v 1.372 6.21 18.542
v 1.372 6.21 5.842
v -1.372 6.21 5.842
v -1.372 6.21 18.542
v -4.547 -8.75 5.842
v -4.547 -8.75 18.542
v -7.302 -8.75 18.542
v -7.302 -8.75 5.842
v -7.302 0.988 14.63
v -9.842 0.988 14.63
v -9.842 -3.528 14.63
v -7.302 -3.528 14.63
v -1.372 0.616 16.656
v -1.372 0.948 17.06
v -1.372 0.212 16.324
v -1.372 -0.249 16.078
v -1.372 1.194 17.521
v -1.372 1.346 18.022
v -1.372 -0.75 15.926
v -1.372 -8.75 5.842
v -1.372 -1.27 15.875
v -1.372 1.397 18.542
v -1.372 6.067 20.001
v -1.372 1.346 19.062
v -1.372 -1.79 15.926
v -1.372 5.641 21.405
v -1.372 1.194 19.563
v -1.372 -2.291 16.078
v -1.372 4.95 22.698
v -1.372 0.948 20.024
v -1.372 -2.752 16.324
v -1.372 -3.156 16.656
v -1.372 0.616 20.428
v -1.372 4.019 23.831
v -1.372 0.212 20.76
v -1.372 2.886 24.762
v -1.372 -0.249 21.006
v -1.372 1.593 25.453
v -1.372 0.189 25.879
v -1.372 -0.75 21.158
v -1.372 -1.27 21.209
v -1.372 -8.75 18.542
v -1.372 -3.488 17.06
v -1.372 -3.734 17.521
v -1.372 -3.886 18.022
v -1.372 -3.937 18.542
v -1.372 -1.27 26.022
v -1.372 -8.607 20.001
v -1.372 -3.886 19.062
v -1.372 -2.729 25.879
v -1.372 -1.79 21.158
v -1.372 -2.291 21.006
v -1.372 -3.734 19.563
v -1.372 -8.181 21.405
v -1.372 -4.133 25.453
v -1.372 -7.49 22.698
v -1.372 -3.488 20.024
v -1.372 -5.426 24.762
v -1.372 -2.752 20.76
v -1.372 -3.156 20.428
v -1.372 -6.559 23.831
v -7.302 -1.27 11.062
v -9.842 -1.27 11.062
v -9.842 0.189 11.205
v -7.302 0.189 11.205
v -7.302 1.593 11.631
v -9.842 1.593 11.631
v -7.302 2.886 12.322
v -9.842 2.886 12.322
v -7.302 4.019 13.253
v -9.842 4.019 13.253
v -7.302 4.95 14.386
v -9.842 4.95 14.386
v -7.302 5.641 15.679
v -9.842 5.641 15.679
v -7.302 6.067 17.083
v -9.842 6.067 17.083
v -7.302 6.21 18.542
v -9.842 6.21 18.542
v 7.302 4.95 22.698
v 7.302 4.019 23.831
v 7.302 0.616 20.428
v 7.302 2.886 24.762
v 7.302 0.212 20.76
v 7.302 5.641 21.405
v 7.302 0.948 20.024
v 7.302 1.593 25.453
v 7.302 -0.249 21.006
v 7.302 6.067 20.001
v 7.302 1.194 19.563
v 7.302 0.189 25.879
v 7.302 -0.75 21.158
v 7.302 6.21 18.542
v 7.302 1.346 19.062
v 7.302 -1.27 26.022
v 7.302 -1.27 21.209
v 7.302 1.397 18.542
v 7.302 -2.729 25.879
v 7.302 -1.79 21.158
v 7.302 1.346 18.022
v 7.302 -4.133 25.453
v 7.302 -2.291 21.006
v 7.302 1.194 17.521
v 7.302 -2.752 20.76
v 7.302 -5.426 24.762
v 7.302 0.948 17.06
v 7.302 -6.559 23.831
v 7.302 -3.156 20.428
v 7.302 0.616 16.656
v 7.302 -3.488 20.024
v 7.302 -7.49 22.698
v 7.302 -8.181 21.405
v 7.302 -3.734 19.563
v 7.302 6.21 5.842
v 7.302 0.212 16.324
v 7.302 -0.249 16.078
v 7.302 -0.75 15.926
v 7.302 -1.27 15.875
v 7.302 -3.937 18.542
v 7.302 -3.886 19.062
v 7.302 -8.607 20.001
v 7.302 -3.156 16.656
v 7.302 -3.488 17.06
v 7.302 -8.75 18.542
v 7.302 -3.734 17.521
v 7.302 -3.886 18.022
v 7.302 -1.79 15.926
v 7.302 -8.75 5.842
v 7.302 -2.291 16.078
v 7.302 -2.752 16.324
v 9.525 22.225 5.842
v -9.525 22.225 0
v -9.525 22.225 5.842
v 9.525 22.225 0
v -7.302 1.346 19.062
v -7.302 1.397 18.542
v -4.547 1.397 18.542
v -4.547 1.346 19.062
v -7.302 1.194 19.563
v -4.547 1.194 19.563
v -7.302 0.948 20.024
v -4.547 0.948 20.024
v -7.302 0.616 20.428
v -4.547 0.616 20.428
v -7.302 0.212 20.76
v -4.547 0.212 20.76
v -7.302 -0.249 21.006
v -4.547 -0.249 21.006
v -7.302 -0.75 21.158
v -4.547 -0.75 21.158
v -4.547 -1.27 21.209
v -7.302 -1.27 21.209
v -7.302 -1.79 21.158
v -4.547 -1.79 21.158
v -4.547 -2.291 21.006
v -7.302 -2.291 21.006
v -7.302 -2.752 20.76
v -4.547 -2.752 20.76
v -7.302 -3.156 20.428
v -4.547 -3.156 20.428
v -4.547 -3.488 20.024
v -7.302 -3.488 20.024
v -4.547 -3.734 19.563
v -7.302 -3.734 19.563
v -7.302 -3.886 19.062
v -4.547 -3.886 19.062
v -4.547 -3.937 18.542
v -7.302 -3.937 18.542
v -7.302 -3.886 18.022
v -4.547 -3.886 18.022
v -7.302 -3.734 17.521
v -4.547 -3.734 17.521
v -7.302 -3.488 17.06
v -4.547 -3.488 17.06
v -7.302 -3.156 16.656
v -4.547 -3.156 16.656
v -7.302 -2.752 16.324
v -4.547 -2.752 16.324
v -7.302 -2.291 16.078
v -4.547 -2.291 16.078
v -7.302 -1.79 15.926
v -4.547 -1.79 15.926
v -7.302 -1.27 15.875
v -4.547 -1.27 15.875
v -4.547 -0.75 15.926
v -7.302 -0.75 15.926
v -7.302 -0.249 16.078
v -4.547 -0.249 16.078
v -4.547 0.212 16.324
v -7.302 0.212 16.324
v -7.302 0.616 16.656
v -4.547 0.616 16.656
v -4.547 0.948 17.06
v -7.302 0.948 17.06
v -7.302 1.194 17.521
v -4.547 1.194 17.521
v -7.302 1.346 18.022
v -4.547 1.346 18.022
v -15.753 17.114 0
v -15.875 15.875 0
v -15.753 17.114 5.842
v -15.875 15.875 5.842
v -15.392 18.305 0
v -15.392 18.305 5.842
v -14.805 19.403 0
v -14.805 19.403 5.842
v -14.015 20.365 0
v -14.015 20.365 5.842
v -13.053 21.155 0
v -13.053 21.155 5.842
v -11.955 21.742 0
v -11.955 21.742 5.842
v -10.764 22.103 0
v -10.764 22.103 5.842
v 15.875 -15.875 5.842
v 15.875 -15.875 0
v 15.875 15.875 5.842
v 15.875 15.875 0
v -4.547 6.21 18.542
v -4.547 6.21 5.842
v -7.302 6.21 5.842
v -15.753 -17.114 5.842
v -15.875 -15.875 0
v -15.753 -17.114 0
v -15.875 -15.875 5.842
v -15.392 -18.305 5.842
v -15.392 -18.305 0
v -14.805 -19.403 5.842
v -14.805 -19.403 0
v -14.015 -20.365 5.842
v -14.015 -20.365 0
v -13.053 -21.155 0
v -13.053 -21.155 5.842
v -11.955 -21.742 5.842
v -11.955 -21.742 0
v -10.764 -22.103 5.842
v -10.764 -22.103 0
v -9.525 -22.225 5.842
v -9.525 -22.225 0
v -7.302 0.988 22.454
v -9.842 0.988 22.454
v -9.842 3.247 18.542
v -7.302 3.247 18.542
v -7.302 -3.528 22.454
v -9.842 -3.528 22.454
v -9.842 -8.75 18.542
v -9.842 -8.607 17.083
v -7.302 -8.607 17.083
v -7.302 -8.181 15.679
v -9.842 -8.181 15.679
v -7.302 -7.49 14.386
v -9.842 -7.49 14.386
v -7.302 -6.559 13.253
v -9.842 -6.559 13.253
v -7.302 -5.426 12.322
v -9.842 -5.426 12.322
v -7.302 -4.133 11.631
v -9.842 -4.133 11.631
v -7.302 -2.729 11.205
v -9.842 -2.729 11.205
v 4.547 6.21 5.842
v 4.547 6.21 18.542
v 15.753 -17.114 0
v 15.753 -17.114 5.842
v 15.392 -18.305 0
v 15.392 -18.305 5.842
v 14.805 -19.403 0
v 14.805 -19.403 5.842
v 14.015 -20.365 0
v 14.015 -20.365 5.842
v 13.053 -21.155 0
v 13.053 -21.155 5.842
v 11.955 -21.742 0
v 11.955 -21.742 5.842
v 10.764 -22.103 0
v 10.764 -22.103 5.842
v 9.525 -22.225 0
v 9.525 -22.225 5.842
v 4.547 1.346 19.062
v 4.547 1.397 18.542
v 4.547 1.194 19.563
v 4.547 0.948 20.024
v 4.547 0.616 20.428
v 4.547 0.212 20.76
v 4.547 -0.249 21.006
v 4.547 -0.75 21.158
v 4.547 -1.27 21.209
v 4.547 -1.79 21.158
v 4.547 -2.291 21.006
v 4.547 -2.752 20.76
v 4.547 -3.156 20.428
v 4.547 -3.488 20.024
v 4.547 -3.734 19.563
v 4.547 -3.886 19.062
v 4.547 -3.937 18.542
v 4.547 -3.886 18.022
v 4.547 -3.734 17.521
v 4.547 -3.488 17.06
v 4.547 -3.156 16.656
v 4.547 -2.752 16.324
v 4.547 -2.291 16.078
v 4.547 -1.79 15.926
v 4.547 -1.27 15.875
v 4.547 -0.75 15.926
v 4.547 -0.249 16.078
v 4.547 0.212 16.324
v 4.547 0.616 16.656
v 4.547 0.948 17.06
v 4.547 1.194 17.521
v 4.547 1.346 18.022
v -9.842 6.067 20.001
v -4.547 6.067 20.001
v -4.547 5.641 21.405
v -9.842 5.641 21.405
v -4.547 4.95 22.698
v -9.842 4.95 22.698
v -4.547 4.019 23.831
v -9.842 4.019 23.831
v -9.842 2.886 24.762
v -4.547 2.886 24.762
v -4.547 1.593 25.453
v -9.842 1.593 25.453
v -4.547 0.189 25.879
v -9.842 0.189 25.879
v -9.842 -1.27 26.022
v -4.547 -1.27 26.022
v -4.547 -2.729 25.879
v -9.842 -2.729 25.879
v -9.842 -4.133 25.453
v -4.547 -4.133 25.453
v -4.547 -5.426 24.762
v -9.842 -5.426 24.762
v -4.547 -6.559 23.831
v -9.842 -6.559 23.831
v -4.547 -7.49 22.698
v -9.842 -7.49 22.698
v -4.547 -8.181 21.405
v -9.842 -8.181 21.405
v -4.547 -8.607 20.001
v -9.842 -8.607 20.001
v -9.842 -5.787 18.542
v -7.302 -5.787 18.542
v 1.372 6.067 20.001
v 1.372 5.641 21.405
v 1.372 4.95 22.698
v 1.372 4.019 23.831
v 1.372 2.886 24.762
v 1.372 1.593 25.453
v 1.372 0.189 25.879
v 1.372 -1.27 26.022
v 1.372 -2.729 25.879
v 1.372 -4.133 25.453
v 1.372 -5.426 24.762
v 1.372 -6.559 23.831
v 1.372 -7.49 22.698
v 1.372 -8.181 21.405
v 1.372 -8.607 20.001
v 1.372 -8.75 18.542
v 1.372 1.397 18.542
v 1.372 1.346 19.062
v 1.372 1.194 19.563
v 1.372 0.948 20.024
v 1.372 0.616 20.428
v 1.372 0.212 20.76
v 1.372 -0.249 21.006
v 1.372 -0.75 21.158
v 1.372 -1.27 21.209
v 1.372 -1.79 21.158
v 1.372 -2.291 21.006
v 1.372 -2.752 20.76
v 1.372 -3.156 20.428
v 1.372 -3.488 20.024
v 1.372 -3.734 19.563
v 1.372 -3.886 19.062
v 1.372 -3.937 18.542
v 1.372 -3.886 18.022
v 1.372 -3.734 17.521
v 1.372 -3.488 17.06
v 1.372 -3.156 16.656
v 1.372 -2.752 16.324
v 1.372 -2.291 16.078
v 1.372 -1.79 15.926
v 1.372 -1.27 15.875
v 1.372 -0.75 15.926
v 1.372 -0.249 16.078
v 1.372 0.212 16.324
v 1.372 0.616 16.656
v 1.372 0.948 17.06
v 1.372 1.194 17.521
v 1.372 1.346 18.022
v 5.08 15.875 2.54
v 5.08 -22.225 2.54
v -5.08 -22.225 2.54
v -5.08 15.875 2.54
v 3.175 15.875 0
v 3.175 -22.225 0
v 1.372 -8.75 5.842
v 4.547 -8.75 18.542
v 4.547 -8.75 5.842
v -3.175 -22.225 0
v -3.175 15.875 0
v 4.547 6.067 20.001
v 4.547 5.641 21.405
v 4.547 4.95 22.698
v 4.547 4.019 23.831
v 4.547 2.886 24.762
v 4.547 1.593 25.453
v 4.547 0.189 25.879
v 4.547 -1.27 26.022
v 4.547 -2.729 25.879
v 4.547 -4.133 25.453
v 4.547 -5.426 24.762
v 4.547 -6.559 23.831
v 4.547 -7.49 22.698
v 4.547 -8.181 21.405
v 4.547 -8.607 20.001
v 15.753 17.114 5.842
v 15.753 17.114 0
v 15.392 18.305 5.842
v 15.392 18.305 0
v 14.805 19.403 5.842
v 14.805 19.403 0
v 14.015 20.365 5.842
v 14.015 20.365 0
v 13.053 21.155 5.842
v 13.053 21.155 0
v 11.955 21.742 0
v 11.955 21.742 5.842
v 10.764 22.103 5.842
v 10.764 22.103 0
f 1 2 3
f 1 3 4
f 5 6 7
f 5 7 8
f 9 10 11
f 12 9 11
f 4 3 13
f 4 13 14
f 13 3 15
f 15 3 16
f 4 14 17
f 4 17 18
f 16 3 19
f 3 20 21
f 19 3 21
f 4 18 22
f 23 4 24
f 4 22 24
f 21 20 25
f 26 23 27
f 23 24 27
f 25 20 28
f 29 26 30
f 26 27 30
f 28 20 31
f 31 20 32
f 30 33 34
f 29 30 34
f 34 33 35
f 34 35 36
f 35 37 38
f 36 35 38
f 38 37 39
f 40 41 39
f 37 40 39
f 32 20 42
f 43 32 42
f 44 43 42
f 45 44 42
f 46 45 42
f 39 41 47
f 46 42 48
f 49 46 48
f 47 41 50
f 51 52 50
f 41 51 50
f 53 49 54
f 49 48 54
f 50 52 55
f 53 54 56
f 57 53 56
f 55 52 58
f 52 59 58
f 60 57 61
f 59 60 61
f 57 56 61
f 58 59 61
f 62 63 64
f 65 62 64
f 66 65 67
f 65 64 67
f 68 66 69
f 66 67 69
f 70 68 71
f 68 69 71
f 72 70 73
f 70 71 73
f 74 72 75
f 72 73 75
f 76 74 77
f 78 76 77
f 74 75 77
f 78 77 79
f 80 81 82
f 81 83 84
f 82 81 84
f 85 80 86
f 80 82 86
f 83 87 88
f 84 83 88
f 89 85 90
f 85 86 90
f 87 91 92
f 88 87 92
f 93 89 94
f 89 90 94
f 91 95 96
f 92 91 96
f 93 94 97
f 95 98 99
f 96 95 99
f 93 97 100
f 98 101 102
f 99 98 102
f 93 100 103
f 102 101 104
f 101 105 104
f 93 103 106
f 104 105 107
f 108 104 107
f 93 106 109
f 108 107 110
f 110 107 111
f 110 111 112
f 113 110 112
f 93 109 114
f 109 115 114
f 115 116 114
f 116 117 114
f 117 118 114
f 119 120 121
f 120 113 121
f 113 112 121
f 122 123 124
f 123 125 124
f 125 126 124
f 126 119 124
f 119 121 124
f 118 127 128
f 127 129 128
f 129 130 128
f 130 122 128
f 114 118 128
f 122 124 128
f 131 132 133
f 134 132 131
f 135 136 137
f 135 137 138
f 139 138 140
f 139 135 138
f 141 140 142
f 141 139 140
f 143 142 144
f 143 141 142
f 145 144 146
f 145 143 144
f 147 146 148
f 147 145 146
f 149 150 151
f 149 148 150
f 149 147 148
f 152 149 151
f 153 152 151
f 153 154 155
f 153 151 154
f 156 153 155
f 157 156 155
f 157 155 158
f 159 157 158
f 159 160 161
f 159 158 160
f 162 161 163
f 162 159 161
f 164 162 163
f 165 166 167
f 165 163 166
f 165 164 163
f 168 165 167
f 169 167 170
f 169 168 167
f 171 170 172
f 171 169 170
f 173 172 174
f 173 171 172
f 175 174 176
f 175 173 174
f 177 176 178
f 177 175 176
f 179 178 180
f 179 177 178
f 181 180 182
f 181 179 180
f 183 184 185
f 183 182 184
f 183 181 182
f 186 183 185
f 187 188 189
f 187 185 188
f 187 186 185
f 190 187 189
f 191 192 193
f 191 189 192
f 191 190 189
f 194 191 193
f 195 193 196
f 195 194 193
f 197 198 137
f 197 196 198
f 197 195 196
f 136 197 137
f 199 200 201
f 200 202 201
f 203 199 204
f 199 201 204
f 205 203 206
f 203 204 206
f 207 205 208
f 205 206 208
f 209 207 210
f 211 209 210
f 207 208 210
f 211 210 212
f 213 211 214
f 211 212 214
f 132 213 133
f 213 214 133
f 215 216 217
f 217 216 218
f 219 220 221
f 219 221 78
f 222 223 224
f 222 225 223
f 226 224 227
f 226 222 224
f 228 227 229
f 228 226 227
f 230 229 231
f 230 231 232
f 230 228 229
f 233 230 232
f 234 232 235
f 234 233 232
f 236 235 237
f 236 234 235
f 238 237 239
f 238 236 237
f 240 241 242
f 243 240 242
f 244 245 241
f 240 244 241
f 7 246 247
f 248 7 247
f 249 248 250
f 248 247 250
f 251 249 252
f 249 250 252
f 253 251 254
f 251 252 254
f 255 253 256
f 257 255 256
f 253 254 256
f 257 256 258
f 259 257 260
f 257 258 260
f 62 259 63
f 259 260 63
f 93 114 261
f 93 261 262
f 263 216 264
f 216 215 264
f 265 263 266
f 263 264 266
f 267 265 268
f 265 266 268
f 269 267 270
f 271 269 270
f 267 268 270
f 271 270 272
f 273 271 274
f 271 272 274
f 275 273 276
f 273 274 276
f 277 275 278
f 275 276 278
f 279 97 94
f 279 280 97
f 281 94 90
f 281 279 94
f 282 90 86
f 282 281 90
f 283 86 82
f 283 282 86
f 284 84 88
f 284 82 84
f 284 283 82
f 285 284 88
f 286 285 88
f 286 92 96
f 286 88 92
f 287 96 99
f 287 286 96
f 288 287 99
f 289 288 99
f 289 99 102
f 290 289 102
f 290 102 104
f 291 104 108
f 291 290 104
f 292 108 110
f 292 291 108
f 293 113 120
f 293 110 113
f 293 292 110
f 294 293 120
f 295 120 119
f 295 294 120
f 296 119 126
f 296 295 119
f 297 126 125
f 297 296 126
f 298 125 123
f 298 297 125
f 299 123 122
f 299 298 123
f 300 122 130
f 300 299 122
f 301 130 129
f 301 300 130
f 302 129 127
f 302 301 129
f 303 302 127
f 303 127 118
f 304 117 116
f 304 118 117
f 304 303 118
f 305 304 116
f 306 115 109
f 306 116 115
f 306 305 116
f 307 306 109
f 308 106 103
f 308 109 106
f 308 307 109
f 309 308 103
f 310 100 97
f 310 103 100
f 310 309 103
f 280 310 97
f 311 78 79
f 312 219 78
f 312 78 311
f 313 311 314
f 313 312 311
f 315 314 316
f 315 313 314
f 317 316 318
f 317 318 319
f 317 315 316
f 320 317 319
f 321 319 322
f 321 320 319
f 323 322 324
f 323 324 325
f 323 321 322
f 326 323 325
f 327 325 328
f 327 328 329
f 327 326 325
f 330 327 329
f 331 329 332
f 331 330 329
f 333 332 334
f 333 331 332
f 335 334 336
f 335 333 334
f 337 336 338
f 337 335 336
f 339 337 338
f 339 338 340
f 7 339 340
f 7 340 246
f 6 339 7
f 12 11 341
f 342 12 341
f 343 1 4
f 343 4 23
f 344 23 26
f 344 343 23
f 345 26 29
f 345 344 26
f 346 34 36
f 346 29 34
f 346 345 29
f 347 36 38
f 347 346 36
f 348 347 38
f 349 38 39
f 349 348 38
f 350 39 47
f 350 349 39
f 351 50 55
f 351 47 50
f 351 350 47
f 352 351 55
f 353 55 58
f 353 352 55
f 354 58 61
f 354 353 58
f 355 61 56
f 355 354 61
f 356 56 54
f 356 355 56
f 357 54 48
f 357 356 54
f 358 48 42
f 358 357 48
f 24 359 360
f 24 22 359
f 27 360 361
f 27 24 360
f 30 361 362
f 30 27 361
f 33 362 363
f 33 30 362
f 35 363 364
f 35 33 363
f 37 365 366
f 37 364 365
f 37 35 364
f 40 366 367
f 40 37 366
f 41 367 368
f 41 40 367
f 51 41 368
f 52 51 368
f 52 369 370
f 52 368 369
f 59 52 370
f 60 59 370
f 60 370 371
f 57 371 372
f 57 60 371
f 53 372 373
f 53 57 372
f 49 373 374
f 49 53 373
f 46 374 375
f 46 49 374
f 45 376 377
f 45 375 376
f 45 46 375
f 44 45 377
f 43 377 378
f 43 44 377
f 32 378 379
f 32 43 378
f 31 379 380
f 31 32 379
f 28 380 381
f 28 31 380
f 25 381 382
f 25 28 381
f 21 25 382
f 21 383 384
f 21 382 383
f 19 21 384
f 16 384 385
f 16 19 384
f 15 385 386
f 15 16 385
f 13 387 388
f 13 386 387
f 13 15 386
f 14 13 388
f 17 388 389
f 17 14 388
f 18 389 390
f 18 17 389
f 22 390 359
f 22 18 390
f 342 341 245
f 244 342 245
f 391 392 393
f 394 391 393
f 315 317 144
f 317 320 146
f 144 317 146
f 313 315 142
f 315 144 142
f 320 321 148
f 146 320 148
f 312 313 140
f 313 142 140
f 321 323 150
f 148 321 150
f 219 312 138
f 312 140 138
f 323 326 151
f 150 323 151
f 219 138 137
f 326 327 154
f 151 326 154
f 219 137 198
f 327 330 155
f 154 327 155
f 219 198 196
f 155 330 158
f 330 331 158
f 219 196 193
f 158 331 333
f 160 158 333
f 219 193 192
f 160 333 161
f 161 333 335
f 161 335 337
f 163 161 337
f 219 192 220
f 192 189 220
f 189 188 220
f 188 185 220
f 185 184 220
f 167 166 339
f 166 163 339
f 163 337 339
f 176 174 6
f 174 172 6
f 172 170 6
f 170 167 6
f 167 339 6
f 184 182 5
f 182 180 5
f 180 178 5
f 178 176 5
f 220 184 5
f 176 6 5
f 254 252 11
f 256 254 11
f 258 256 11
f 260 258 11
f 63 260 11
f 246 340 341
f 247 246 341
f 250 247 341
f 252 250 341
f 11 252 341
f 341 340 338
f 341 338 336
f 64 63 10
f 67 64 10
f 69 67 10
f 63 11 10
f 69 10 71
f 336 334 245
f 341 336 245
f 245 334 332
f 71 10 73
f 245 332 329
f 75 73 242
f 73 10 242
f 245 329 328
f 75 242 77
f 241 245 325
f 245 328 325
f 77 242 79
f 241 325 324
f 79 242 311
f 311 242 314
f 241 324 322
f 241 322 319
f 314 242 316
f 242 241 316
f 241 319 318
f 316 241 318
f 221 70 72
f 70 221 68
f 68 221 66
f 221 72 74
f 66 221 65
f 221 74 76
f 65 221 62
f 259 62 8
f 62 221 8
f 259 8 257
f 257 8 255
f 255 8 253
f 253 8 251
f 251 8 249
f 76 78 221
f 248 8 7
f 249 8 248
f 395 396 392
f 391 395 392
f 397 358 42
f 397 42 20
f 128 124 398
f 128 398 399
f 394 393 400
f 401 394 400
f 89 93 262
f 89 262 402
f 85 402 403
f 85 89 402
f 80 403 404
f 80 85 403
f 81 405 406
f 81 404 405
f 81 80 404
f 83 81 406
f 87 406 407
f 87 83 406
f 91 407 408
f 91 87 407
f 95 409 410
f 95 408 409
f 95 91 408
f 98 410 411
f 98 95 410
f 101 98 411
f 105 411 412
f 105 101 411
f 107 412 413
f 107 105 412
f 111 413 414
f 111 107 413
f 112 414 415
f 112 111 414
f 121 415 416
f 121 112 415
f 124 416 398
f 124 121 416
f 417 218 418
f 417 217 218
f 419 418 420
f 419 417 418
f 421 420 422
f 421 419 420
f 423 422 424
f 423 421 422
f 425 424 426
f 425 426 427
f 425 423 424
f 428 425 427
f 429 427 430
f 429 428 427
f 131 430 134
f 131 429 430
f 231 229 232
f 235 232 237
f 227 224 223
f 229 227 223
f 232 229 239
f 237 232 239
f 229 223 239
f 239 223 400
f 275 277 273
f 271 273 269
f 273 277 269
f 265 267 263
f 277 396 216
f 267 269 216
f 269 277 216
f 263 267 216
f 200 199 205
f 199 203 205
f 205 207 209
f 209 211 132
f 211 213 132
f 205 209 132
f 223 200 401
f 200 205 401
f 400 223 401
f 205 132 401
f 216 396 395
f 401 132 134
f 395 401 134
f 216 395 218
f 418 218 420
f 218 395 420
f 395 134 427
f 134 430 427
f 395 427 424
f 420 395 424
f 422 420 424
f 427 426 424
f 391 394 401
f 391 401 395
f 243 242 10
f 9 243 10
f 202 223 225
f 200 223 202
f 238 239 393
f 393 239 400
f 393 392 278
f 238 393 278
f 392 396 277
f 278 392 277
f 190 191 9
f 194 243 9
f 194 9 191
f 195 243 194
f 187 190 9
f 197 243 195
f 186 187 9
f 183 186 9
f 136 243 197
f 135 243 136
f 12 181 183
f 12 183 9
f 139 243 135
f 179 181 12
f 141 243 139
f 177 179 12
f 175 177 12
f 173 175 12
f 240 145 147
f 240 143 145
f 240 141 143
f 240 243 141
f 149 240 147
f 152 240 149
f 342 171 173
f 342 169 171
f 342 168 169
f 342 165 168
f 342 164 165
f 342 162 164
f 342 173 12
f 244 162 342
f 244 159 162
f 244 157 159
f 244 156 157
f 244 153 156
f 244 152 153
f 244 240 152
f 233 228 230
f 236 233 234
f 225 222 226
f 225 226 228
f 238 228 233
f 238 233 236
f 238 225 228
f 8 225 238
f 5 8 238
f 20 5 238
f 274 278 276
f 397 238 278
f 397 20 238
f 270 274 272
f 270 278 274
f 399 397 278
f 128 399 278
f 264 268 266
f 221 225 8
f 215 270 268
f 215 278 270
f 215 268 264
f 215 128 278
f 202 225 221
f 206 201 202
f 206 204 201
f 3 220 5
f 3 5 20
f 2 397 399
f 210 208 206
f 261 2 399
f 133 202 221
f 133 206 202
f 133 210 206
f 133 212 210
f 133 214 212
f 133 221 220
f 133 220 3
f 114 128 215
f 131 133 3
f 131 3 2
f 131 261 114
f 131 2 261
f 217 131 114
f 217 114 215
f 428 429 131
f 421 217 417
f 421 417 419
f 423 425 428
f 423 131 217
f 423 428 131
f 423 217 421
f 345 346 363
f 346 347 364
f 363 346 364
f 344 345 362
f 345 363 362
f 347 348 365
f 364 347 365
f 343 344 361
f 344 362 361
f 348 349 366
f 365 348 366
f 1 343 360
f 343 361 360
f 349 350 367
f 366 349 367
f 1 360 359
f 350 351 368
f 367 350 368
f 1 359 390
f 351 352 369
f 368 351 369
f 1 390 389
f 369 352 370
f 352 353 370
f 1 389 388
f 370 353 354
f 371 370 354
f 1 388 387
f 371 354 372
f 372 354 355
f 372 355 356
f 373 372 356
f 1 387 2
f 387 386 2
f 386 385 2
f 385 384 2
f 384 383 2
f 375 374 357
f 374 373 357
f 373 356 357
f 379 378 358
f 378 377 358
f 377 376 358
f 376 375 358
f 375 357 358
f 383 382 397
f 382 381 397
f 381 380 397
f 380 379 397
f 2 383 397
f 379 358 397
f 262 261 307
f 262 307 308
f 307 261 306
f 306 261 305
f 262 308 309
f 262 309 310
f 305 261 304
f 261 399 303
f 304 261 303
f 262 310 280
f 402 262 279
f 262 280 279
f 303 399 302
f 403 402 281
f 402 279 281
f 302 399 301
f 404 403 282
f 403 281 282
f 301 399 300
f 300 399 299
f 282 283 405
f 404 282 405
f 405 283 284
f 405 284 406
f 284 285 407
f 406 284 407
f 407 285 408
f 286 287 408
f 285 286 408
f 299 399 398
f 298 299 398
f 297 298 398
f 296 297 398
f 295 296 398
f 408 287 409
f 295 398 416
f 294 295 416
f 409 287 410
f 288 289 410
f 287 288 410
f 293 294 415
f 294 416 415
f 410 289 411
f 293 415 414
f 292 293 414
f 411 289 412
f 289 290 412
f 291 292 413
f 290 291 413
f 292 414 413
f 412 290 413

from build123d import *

# Parameters (mm, degrees)
F0_W      = 31.75
F0_H      = 44.45
F1_DEPTH  = 5.842
F3_DEPTH  = 38.1
F4_R      = 2.667
F5_DEPTH  = 9.8425
F6_W      = 2.54
F6_H      = 7.4803
F6_H_2    = 12.7
F6_W_2    = 3.175
F6_H_3    = 5.2197
F7_DEPTH  = 25.4
F9_DEPTH  = 2.54
F10_R     = 6.35
F11_R     = 2.667
F12_DEPTH = 2.54


with BuildPart() as f1:
    # F0 (on Top) → F1 (new body)
    with BuildSketch(Plane.XY):
        Rectangle(F0_W, F0_H)
    extrude(amount=F1_DEPTH)

    # F2 (on face) → F3 (cut)
    with BuildSketch(Plane.XZ.offset(22.225)):
        Polygon((5.08, 2.54), (0, 2.54), (-5.08, 2.54), (-3.175, 0), (3.175, 0), align=None)
    extrude(amount=-F3_DEPTH, mode=Mode.SUBTRACT)

    # F4 (on Right) → F5 (join, symmetric)
    with BuildSketch(Plane.YZ):
        with BuildLine():
            Line((-8.7503, 18.542), (-8.7503, 5.842))
            Line((-8.7503, 5.842), (6.2103, 5.842))
            Line((6.2103, 5.842), (6.2103, 18.542))
            ThreePointArc((6.2103, 18.542), (-1.27, 26.0223), (-8.7503, 18.542))
        make_face()
        with Locations((-1.27, 18.542)):
            Circle(F4_R, mode=Mode.SUBTRACT)
    extrude(amount=F5_DEPTH, both=True)

    # F6 (on face) → F7 (cut)
    with BuildSketch(Plane.XZ.offset(8.7503)):
        with Locations((8.5725, 22.28215)):
            Rectangle(F6_W, F6_H)
        with Locations((8.5725, 12.192)):
            Rectangle(F6_W, F6_H_2)
        with Locations((2.9591, 22.28215)):
            Rectangle(F6_W_2, F6_H)
        with Locations((2.9591, 12.192)):
            Rectangle(F6_W_2, F6_H_2)
        with Locations((-2.9591, 22.28215)):
            Rectangle(F6_W_2, F6_H)
        with Locations((-2.9591, 12.192)):
            Rectangle(F6_W_2, F6_H_2)
        with Locations((-8.5725, 8.45185)):
            Rectangle(F6_W, F6_H_3)
    extrude(amount=-F7_DEPTH, mode=Mode.SUBTRACT)

    # F8 (on face) → F9 (cut)
    with BuildSketch(Plane(origin=(-9.8425, 0, 0), x_dir=(0, -1, 0), z_dir=(-1, 0, 0))):
        with BuildLine():
            ThreePointArc((1.27, 11.0617), (-4.019371, 13.252629), (-6.2103, 18.542))
            Line((-6.2103, 18.542), (-6.2103, 11.0617))
            Line((-6.2103, 11.0617), (1.27, 11.0617))
        make_face()
        with BuildLine():
            ThreePointArc((8.7503, 18.542), (6.559371, 13.252629), (1.27, 11.0617))
            Line((1.27, 11.0617), (8.7503, 11.0617))
            Line((8.7503, 11.0617), (8.7503, 18.542))
        make_face()
    extrude(amount=-F9_DEPTH, mode=Mode.SUBTRACT)

    # F10
    f10_edges = [f1.edges().sort_by_distance(p)[0] for p in [
        (15.875, 22.225, 2.921),
        (-15.875, 22.225, 2.921),
        (-15.875, -22.225, 2.921),
        (15.875, -22.225, 2.921),
    ]]
    fillet(f10_edges, radius=F10_R)

    # F11 (on face) → F12 (cut)
    with BuildSketch(Plane(origin=(-9.8425, 0, 0), x_dir=(0, -1, 0), z_dir=(-1, 0, 0))):
        Polygon((3.528363, 22.4536), (-0.988363, 22.4536), (-3.246727, 18.542), (-0.988363, 14.6304), (3.528363, 14.6304), (5.786727, 18.542), align=None)
        with Locations((1.27, 18.542)):
            Circle(F11_R, mode=Mode.SUBTRACT)
    extrude(amount=-F12_DEPTH, mode=Mode.SUBTRACT)


solid = f1.part
